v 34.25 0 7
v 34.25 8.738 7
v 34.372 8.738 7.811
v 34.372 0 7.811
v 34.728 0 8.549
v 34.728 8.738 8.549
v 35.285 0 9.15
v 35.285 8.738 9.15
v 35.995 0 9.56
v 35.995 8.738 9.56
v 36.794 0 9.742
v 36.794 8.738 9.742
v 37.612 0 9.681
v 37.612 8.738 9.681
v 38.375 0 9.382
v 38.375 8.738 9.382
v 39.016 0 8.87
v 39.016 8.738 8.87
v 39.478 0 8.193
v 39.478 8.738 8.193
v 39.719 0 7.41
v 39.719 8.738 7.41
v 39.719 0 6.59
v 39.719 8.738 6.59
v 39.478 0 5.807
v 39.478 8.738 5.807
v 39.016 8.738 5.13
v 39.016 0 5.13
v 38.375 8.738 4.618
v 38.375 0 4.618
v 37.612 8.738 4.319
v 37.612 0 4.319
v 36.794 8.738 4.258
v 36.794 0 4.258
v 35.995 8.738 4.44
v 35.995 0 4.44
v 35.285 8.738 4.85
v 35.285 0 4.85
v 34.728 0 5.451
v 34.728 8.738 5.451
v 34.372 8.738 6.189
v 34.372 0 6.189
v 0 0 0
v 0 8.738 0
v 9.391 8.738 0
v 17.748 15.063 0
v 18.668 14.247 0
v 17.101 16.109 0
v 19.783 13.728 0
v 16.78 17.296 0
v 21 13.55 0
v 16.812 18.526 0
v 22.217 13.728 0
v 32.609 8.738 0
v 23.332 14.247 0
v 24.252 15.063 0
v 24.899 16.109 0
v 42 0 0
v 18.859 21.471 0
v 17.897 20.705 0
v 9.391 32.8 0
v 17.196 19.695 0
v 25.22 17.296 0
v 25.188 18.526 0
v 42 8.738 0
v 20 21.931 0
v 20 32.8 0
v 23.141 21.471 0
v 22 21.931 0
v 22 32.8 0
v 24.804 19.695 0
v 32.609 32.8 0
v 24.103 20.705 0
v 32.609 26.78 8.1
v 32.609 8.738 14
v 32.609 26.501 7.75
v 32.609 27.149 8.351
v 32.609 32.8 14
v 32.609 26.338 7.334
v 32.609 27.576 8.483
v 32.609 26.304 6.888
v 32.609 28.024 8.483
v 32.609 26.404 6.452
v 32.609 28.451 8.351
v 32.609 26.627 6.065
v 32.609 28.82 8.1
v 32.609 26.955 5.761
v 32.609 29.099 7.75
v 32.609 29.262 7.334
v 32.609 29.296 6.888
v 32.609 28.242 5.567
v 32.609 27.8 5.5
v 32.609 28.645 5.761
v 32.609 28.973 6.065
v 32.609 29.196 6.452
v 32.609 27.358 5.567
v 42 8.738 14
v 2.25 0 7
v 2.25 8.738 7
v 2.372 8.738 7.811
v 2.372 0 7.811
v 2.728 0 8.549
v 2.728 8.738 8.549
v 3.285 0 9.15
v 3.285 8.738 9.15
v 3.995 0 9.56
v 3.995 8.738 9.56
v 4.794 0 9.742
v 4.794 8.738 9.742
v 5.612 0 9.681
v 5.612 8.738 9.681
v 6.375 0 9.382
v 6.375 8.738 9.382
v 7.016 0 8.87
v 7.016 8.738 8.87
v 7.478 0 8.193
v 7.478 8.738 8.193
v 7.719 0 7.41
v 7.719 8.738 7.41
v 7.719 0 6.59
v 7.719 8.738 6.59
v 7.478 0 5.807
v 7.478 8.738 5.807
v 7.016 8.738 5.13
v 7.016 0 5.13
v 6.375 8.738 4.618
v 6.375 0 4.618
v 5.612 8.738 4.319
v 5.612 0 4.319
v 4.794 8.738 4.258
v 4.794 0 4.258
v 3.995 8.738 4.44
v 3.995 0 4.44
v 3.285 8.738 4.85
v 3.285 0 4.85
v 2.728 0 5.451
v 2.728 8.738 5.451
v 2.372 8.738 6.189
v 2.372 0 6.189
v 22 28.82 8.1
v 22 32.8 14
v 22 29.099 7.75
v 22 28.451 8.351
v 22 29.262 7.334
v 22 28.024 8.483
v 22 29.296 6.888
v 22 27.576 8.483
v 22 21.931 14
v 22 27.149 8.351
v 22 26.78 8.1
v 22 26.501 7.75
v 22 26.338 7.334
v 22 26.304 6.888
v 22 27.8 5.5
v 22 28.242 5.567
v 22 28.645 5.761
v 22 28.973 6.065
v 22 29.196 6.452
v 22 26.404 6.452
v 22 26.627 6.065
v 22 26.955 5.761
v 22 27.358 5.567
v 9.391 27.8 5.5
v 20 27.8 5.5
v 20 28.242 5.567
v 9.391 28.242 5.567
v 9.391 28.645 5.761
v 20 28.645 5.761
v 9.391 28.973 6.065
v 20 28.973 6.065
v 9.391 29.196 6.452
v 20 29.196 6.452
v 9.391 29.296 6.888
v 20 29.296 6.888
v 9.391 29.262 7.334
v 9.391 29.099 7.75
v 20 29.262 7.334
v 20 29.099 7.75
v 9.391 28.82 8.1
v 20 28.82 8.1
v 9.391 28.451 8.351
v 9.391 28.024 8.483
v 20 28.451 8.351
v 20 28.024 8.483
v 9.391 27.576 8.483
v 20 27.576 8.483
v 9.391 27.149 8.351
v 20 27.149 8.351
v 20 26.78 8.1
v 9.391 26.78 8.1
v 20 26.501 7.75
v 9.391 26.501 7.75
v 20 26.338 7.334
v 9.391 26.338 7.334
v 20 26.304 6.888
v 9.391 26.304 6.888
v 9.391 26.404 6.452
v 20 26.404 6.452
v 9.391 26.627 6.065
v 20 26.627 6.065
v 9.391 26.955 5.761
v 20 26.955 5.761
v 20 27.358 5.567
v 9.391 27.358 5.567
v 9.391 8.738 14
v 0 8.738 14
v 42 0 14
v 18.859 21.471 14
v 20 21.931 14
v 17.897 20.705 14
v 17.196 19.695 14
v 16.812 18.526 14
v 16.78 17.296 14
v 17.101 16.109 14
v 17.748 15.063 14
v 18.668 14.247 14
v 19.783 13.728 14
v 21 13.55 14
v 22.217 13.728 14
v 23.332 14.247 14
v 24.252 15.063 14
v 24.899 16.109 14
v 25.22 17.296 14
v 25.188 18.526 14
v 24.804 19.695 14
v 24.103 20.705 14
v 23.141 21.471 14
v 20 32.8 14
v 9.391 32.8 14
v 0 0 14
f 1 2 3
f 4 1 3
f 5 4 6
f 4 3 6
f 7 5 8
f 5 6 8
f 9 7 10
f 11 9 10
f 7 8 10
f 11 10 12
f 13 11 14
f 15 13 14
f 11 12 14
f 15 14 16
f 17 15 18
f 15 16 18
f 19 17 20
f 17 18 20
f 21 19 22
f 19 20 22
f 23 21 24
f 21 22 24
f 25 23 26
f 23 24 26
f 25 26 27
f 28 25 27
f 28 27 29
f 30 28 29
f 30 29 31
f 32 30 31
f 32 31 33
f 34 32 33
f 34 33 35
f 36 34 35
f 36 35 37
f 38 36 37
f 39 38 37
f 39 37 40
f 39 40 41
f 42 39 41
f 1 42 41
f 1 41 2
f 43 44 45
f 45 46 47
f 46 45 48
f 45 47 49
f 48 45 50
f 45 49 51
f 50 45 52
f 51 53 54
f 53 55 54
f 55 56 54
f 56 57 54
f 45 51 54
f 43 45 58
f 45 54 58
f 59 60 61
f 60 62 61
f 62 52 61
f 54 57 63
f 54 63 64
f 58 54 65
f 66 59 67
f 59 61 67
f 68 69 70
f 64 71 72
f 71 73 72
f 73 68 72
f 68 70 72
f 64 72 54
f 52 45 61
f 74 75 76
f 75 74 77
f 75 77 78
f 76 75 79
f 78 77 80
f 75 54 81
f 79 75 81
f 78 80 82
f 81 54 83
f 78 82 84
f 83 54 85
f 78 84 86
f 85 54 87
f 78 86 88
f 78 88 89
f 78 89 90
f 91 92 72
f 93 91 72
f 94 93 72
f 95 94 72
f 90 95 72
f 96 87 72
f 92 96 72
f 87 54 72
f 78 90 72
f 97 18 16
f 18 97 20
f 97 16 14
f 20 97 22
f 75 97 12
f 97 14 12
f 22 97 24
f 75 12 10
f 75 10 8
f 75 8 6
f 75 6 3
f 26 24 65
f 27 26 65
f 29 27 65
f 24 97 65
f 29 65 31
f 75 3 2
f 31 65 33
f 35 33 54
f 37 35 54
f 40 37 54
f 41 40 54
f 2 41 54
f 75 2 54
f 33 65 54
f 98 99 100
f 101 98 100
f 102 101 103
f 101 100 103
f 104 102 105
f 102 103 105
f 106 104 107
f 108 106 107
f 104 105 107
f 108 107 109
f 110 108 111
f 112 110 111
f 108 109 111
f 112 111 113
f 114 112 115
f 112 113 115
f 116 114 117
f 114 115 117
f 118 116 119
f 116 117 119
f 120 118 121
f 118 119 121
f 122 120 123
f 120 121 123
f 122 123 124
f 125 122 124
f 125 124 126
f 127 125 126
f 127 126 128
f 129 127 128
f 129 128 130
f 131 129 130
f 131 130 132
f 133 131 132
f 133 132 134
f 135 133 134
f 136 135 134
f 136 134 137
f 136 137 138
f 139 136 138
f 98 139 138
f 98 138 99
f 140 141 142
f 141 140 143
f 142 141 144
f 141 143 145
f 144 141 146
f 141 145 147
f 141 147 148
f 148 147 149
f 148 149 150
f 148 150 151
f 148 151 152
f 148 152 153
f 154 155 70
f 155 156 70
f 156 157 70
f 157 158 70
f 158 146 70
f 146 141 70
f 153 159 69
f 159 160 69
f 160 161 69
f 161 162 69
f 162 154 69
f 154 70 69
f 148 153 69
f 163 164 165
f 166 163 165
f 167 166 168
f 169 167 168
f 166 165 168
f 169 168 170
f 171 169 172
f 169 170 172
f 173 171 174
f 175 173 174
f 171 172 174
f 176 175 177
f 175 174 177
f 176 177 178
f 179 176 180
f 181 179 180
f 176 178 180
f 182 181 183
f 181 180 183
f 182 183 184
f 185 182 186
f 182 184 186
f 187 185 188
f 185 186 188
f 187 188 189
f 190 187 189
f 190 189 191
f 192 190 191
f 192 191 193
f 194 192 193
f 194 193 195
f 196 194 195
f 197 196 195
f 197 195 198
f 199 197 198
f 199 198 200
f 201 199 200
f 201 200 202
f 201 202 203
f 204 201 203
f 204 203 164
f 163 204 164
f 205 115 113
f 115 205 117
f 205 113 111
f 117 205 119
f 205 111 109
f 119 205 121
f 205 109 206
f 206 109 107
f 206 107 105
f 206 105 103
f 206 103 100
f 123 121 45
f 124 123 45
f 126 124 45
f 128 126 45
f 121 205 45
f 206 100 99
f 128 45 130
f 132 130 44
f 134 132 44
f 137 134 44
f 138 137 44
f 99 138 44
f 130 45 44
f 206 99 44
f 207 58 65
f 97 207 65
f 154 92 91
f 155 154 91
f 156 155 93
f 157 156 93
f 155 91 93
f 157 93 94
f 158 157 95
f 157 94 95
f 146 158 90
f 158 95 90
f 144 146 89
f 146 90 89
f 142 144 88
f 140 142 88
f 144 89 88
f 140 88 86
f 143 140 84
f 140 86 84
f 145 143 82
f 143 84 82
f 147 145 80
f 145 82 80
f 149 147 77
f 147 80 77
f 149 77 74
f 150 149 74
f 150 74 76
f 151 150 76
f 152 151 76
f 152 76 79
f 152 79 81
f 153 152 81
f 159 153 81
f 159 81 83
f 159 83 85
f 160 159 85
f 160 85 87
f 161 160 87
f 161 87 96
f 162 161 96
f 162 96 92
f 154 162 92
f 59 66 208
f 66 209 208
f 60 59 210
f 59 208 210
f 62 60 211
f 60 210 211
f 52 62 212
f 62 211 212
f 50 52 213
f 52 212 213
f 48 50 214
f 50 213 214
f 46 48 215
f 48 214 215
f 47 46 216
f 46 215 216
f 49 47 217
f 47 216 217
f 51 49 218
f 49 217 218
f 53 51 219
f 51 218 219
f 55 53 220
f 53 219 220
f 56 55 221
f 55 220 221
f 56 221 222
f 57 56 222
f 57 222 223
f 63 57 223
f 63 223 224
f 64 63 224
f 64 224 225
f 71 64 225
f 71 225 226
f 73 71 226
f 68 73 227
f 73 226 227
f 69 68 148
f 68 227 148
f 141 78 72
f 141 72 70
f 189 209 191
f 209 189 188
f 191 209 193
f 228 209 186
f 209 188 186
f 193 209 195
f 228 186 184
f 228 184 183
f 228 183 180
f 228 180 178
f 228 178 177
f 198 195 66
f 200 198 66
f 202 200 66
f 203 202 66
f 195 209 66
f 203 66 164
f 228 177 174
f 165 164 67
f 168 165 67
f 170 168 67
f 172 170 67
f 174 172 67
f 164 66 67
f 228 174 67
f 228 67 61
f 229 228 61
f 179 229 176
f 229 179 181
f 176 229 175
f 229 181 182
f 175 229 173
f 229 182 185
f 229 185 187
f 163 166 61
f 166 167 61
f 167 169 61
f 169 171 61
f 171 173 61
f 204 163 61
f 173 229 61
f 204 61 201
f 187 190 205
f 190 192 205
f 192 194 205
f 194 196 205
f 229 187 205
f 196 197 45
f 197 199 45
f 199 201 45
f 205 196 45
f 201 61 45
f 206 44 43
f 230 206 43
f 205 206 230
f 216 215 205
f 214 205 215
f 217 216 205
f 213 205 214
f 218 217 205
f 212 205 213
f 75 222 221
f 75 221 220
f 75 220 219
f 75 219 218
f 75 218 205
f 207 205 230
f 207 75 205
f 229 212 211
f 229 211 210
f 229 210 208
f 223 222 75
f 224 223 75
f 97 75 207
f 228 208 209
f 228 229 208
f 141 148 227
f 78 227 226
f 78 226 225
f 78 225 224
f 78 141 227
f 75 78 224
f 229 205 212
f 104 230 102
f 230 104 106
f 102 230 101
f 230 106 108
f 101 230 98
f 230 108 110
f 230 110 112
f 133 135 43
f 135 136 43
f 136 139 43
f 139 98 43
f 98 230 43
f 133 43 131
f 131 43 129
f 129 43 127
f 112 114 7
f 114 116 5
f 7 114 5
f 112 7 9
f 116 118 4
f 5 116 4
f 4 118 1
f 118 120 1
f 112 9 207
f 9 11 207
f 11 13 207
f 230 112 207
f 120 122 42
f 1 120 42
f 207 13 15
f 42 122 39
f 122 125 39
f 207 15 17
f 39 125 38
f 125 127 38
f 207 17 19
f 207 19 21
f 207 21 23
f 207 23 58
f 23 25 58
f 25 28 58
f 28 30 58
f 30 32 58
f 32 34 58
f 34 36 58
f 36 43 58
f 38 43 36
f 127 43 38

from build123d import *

# Parameters (mm, degrees)
BOSS_EXTRUDE1_DEPTH = 14
SKETCH2_R           = 4.25
CUT_EXTRUDE1_DEPTH  = 56.098457329
SKETCH3_R           = 2.75
CUT_EXTRUDE2_DEPTH  = 51.388516183
SKETCH4_R           = 1.5
CUT_EXTRUDE3_DEPTH  = 49.323962746


with BuildPart() as part:
    # Sketch1 → Boss-Extrude1 (new body)
    with BuildSketch(Plane.XY):
        Polygon((0, 0), (42, 0), (42, 8.73752791), (32.609283578, 8.73752791), (32.609283578, 32.8), (22, 32.8), (22, 17.8), (20, 17.8), (20, 32.8), (9.390716422, 32.8), (9.390716422, 8.73752791), (0, 8.73752791), align=None)
    extrude(amount=BOSS_EXTRUDE1_DEPTH)

    # Sketch2 → Cut-Extrude1 (cut, through all)
    with BuildSketch(Plane.XY.offset(14)):
        with Locations((21, 17.8)):
            Circle(SKETCH2_R)
    extrude(amount=-CUT_EXTRUDE1_DEPTH, mode=Mode.SUBTRACT)

    # Sketch3 → Cut-Extrude2 (cut, through all)
    with BuildSketch(Plane(origin=(0, 8.73752791, 0), x_dir=(1, 0, 0), z_dir=(0, 1, 0))):
        with Locations(Location((5, -7, 0), (0, 0, 180))):
            Circle(SKETCH3_R)
        with Locations(Location((37, -7, 0), (0, 0, 180))):
            Circle(SKETCH3_R)
    extrude(amount=-CUT_EXTRUDE2_DEPTH, mode=Mode.SUBTRACT)

    # Sketch4 → Cut-Extrude3 (cut, through all)
    with BuildSketch(Plane(origin=(32.609283578, 0, 0), x_dir=(0, 0, -1), z_dir=(1, 0, 0))):
        with Locations((-7, 27.8)):
            Circle(SKETCH4_R)
    extrude(amount=-CUT_EXTRUDE3_DEPTH, mode=Mode.SUBTRACT)


solid = part.part
